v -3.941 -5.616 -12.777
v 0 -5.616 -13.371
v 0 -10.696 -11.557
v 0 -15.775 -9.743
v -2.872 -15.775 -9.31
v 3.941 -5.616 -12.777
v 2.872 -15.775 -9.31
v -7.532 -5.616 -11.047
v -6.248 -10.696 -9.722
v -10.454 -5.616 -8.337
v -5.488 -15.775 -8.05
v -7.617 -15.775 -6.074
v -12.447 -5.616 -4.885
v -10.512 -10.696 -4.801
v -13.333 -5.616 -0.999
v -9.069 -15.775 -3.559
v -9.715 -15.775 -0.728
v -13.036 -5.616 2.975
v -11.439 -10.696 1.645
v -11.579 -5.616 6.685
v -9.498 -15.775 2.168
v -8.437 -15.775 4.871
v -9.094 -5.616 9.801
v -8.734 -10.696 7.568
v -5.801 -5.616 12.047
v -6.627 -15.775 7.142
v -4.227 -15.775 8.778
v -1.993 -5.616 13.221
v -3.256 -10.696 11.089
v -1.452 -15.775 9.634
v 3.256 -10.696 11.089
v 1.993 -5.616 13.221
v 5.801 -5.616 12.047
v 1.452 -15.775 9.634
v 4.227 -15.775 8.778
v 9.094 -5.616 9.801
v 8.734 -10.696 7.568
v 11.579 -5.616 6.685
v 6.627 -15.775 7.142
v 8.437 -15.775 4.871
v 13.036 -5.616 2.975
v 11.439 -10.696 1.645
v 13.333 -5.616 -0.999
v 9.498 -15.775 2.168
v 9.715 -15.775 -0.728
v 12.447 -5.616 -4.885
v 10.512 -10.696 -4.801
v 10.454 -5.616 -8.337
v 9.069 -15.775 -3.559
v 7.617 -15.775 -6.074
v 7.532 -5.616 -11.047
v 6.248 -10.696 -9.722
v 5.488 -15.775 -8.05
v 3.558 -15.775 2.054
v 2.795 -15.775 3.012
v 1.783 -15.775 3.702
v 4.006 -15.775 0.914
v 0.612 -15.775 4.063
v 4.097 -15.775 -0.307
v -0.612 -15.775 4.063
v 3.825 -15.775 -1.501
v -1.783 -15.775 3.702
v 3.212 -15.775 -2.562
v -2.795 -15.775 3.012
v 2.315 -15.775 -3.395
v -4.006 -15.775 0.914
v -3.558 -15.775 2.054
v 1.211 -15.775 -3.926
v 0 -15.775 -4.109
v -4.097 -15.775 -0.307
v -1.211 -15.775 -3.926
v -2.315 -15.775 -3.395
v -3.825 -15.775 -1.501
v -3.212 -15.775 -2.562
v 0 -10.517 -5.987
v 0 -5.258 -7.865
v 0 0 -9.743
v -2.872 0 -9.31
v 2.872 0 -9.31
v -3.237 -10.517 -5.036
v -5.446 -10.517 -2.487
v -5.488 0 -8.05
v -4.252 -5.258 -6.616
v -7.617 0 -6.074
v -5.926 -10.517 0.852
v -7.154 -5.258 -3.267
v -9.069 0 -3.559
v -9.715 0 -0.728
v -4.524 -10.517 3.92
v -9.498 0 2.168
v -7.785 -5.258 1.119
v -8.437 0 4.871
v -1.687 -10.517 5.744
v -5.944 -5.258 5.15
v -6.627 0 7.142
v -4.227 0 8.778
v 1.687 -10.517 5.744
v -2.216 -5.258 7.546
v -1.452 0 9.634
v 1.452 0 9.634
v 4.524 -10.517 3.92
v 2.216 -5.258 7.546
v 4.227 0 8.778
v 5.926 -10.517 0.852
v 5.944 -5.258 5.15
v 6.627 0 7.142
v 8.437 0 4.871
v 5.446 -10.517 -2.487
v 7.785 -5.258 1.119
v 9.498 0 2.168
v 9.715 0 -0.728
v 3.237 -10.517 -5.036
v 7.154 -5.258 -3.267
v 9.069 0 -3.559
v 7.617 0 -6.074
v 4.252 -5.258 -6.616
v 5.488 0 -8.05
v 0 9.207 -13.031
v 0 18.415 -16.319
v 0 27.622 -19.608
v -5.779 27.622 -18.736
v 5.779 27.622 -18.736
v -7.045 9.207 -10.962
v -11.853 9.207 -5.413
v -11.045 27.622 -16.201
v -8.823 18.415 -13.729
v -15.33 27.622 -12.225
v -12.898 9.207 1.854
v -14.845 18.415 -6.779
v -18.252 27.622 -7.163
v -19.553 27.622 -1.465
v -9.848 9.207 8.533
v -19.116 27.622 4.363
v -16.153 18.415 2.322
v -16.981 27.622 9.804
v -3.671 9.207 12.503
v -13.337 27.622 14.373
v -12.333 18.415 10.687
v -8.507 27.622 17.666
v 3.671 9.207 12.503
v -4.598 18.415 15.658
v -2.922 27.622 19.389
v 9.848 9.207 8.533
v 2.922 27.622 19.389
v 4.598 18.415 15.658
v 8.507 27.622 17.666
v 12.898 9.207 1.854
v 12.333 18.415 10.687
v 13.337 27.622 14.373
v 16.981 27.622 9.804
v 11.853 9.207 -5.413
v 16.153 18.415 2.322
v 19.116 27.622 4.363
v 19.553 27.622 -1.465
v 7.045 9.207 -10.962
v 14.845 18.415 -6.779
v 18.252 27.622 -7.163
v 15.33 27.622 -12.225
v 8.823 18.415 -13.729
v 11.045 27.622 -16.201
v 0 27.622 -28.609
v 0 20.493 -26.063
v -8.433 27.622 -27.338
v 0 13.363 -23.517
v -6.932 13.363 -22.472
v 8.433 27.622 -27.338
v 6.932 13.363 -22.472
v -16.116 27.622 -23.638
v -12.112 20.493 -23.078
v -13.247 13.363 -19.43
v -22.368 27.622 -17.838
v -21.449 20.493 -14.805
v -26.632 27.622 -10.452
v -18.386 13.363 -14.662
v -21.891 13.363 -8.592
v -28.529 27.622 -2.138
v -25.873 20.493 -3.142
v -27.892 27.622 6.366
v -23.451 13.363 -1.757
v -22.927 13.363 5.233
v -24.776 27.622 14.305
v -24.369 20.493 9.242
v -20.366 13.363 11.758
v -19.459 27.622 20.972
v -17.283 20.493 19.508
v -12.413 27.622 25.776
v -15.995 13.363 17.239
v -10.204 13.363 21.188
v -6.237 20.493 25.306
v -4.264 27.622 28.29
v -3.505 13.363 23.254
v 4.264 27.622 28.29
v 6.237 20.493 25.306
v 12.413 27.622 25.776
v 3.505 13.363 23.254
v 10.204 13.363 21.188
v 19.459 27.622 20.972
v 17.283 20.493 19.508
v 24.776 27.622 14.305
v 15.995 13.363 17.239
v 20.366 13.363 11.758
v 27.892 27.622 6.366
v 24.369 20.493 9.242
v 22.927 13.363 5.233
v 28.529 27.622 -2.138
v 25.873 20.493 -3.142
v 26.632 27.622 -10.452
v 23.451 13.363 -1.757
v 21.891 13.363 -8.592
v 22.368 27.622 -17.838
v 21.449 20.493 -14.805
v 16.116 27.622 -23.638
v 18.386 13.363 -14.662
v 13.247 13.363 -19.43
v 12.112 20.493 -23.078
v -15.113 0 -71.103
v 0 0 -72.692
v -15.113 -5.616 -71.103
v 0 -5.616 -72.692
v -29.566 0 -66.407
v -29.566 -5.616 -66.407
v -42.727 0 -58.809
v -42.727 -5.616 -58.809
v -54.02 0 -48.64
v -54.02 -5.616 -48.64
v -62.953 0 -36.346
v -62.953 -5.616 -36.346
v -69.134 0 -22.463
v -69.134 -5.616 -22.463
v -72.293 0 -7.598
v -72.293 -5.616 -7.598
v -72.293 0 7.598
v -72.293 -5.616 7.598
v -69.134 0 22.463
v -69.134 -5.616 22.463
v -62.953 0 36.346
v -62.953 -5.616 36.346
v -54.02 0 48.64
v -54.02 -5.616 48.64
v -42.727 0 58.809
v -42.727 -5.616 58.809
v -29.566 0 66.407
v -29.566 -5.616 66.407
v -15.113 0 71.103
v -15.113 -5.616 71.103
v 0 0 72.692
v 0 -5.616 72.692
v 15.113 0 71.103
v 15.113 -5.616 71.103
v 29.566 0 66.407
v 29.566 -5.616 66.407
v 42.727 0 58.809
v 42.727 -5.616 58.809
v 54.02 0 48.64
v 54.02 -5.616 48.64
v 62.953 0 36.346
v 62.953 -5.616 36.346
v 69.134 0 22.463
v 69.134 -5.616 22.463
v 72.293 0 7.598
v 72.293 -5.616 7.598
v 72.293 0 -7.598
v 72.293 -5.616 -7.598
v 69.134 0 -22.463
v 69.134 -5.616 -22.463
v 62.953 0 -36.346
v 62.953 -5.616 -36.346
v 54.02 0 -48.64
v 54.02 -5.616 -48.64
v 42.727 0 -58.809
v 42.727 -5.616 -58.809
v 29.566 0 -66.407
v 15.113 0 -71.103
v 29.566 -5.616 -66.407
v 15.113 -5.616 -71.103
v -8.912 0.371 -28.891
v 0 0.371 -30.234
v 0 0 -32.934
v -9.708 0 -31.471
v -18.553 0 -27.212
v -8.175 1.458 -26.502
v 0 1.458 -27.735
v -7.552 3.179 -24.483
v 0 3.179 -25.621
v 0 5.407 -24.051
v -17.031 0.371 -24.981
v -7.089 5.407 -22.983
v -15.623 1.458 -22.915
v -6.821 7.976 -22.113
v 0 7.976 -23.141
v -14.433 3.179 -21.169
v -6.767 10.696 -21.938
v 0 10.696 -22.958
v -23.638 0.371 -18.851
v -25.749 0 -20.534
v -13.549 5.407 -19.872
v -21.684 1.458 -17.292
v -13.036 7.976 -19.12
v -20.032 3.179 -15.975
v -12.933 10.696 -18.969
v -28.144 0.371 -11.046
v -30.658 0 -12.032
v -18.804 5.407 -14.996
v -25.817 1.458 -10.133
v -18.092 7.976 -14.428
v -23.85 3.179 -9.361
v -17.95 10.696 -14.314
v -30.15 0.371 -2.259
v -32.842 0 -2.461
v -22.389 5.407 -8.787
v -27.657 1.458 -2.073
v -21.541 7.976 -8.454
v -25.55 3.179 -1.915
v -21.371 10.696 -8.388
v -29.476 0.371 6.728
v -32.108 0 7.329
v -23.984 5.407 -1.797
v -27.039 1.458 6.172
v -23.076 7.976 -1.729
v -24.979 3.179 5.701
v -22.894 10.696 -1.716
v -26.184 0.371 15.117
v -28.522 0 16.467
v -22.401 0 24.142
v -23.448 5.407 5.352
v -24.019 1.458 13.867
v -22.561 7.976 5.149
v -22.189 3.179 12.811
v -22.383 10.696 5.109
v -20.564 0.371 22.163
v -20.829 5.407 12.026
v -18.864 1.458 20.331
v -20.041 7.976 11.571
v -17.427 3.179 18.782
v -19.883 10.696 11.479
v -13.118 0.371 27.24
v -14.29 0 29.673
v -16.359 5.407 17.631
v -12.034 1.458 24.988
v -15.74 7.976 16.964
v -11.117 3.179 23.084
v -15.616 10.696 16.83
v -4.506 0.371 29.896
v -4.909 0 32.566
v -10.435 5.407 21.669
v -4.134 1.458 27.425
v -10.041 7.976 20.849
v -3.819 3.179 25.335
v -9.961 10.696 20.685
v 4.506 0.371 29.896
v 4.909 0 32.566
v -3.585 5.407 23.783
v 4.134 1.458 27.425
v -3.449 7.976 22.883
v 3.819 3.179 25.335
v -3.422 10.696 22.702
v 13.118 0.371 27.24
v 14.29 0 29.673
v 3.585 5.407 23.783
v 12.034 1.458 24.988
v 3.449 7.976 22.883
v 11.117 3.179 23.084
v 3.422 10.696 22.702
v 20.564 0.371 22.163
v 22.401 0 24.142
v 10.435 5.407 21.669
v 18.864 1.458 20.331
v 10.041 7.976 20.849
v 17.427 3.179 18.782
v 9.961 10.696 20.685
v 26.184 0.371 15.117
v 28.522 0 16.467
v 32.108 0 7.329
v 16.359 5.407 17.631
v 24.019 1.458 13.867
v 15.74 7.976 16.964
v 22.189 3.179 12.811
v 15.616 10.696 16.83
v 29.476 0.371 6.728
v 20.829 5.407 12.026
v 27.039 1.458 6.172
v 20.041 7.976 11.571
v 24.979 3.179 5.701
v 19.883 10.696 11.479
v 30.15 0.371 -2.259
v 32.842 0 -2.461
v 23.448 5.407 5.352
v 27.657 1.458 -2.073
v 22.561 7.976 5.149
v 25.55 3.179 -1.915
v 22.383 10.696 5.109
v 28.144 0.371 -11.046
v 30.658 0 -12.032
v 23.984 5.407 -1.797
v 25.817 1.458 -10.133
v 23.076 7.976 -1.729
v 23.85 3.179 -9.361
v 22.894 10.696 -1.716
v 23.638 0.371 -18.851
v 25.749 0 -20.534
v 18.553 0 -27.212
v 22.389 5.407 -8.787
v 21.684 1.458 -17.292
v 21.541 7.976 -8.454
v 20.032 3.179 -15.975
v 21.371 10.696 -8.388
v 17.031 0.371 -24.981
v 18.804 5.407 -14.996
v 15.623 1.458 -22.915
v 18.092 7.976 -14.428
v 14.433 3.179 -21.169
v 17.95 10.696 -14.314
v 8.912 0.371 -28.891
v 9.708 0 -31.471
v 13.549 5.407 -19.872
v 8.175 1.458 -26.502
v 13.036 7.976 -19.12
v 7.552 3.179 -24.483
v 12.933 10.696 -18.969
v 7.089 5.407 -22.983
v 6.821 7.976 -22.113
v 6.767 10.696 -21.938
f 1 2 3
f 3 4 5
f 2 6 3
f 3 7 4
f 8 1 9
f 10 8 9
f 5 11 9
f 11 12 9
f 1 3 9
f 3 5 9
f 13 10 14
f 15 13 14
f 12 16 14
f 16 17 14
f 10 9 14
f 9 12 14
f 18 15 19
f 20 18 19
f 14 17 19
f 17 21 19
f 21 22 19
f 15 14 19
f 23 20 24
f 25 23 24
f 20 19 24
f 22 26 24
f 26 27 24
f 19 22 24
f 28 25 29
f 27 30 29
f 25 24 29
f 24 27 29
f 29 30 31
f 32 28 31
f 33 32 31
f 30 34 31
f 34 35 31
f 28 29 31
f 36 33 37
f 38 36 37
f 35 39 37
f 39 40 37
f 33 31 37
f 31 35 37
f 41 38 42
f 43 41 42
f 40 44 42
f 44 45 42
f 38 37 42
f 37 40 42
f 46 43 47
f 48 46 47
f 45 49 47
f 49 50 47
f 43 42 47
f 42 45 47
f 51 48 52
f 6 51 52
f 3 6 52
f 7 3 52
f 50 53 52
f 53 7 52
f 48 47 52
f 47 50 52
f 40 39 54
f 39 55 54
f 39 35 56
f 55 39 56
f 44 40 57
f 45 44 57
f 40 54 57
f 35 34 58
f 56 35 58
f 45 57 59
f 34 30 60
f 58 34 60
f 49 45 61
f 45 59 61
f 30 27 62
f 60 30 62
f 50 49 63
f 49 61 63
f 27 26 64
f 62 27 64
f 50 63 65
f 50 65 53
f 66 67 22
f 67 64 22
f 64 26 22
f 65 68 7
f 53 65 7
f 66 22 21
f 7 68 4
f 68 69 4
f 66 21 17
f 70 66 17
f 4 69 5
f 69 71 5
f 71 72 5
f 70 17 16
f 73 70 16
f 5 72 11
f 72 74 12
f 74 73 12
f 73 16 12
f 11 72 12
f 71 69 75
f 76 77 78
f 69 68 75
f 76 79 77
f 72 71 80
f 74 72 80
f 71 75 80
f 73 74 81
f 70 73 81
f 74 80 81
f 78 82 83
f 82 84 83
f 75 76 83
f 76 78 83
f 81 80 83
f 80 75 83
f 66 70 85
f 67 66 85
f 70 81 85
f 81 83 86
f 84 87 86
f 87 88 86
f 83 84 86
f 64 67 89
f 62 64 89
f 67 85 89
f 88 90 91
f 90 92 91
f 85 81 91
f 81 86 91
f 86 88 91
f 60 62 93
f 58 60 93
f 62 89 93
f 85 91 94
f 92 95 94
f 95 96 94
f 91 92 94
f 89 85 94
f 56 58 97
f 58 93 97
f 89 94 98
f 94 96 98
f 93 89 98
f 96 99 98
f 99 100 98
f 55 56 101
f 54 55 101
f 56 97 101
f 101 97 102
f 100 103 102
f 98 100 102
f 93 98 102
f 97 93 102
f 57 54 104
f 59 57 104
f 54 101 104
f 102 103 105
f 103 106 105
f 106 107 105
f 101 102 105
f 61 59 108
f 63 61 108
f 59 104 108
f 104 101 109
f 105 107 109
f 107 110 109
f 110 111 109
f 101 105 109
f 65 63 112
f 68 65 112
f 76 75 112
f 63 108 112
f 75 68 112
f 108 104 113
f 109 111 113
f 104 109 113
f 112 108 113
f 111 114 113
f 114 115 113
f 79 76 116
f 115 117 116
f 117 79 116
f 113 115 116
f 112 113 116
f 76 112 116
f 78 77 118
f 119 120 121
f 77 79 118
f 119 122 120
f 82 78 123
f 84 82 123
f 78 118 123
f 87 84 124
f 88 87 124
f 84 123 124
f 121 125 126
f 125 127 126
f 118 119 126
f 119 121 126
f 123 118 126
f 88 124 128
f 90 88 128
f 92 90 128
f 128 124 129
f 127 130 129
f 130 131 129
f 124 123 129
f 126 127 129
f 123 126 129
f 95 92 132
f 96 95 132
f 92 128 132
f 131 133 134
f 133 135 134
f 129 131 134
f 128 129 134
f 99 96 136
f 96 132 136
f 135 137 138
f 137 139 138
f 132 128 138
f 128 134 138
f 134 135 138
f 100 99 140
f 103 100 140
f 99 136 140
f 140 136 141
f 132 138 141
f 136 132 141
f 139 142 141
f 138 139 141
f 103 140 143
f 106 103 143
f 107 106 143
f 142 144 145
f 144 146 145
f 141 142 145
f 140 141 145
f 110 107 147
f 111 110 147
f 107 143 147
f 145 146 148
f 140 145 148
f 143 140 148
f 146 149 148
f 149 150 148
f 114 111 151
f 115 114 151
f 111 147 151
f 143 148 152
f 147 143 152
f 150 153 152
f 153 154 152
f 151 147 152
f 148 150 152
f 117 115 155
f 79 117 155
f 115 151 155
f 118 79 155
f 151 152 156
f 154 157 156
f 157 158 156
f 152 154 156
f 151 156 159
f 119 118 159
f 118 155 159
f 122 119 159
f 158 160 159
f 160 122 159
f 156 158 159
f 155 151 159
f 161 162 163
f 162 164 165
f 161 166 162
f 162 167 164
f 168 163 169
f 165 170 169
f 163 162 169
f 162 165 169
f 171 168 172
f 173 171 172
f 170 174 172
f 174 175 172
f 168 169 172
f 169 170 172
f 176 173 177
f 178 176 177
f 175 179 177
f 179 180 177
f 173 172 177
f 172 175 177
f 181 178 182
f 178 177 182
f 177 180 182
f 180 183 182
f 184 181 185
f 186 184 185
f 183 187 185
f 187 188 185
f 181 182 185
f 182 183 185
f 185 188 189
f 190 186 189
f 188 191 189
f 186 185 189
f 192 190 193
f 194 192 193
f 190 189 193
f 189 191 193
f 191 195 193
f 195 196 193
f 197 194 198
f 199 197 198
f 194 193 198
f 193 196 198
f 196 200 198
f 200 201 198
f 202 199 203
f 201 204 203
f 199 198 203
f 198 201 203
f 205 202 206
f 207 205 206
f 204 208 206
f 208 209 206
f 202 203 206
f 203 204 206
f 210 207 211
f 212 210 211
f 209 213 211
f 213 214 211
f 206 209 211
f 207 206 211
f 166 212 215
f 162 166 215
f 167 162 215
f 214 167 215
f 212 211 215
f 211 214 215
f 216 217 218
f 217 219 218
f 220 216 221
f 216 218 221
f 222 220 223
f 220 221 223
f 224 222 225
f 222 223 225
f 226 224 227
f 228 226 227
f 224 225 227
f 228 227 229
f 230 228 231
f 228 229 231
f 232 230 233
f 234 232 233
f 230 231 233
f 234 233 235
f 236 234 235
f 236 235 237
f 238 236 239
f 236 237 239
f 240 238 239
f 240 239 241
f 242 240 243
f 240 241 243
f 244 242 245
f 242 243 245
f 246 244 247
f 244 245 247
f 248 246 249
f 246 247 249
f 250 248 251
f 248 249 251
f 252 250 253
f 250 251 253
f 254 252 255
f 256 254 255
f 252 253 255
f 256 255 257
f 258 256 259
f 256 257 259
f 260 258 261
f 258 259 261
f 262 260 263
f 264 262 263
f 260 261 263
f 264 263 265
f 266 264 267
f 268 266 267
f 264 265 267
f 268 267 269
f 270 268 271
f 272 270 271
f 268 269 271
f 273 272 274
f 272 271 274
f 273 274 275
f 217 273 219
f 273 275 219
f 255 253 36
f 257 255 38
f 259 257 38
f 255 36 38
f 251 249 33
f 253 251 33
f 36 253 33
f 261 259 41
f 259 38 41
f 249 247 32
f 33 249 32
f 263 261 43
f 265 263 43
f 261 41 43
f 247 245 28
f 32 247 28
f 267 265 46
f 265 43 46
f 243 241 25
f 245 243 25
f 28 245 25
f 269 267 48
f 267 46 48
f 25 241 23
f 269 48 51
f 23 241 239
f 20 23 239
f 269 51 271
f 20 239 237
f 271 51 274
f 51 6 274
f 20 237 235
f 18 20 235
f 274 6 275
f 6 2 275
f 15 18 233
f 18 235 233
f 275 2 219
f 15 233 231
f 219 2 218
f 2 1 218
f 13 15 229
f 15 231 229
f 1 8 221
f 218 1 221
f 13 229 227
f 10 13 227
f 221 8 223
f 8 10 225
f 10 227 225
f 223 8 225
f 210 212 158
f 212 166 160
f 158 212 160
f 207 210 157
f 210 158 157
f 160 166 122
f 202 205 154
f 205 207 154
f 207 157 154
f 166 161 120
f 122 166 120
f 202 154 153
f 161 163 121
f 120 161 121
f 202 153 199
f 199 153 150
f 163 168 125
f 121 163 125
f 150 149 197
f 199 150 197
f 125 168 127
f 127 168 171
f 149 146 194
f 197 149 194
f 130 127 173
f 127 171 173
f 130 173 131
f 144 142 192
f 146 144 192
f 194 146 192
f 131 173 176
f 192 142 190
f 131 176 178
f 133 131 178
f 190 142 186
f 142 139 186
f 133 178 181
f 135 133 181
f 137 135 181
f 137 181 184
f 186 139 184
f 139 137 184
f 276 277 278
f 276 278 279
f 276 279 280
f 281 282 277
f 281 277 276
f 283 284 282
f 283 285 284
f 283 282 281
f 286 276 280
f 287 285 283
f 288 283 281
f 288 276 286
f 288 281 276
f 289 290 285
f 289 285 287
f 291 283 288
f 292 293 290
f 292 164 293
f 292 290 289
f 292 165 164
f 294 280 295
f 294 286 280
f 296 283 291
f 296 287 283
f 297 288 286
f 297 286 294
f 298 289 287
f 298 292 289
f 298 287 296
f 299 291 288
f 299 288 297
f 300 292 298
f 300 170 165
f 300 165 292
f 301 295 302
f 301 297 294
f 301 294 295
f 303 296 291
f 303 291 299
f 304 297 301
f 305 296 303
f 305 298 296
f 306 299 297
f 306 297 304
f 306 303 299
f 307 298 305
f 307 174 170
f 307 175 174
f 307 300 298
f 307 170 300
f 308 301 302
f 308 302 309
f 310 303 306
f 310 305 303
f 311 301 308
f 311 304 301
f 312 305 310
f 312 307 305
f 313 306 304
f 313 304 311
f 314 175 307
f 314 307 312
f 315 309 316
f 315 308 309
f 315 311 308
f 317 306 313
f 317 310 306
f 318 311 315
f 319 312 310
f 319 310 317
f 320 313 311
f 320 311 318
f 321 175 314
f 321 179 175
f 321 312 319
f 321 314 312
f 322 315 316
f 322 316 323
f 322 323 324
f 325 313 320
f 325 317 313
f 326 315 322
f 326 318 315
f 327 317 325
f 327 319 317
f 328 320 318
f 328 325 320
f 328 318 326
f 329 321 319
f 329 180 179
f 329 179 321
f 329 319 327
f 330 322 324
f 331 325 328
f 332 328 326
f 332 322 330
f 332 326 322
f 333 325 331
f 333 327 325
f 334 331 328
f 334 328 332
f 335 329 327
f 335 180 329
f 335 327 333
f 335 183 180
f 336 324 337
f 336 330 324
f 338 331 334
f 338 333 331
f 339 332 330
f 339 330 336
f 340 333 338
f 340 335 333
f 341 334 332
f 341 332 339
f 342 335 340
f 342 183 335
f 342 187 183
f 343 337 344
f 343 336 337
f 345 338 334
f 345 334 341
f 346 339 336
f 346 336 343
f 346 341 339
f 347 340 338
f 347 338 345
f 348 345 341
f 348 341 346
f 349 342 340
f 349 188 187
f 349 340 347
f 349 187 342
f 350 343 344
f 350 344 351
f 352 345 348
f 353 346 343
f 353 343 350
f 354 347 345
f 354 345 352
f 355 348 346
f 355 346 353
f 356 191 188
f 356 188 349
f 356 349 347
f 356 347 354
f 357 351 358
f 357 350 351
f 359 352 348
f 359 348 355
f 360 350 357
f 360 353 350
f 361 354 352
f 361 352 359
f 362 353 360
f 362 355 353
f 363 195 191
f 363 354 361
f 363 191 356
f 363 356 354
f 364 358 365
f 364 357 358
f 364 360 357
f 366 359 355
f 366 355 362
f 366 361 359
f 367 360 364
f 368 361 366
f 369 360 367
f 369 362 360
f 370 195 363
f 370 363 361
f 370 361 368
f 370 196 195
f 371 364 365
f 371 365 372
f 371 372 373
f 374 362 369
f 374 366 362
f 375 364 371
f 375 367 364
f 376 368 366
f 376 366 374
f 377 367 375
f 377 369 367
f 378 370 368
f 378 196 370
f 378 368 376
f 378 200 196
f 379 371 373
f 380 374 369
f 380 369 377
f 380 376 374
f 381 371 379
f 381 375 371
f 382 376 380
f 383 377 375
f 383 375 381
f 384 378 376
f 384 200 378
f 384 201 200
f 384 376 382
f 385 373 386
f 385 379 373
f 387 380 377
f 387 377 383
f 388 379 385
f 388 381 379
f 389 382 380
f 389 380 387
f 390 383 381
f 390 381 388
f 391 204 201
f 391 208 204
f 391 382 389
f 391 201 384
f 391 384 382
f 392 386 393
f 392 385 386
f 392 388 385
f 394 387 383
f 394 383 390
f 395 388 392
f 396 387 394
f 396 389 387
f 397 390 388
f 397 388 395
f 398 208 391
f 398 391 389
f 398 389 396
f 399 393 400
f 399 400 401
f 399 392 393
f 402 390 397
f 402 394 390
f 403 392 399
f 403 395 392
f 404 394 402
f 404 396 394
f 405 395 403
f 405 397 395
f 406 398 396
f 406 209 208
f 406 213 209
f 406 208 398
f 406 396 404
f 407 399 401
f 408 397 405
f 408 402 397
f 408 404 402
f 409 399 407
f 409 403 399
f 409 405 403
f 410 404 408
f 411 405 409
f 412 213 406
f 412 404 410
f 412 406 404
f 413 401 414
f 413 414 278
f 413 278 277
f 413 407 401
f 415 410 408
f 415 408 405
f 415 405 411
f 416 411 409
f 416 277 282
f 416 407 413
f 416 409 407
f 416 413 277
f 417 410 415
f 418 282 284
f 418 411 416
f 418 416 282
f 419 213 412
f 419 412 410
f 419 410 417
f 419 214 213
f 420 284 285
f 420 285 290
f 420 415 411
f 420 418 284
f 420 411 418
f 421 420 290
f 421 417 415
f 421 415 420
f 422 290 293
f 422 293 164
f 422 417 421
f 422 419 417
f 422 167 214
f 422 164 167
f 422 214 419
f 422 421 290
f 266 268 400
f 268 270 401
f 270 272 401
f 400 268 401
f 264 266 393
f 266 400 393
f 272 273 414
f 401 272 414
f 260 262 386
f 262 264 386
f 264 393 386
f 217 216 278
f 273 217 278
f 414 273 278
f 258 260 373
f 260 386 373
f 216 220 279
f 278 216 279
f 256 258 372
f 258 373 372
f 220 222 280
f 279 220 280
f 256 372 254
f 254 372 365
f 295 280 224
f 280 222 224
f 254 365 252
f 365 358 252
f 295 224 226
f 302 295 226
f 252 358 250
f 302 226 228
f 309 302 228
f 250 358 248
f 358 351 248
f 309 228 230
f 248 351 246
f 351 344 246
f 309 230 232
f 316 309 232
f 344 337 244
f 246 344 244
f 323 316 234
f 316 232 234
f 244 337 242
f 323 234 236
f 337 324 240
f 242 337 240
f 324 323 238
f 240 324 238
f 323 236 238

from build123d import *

# Parameters (mm, degrees)
FILLET1_R = 10


with BuildPart() as part:
    # Sketch1 → Revolve1 (revolve)
    with BuildSketch(Plane.XY, mode=Mode.PRIVATE) as revolve1_sk:
        Polygon((-18.744174885, 0), (-72.691581878, 0), (-72.691581878, -5.616084741), (-13.370797043, -5.616084741), (-9.742614484, -15.774995906), (-4.108687375, -15.774995906), (-9.742614484, 0), (-19.607603388, 27.621968933), (-28.609163789, 27.621968933), align=None)
    revolve(revolve1_sk.sketch.rotate(Axis((0, 0, 0), (0, 1, 0)), 270), axis=Axis((0, 0, 0), (0, 1, 0)))

    # Fillet1
    fillet1_edges = [part.edges().sort_by_distance(p)[0] for p in [
        (0, 0, 18.744174885),
    ]]
    fillet(fillet1_edges, radius=FILLET1_R)


solid = part.part
